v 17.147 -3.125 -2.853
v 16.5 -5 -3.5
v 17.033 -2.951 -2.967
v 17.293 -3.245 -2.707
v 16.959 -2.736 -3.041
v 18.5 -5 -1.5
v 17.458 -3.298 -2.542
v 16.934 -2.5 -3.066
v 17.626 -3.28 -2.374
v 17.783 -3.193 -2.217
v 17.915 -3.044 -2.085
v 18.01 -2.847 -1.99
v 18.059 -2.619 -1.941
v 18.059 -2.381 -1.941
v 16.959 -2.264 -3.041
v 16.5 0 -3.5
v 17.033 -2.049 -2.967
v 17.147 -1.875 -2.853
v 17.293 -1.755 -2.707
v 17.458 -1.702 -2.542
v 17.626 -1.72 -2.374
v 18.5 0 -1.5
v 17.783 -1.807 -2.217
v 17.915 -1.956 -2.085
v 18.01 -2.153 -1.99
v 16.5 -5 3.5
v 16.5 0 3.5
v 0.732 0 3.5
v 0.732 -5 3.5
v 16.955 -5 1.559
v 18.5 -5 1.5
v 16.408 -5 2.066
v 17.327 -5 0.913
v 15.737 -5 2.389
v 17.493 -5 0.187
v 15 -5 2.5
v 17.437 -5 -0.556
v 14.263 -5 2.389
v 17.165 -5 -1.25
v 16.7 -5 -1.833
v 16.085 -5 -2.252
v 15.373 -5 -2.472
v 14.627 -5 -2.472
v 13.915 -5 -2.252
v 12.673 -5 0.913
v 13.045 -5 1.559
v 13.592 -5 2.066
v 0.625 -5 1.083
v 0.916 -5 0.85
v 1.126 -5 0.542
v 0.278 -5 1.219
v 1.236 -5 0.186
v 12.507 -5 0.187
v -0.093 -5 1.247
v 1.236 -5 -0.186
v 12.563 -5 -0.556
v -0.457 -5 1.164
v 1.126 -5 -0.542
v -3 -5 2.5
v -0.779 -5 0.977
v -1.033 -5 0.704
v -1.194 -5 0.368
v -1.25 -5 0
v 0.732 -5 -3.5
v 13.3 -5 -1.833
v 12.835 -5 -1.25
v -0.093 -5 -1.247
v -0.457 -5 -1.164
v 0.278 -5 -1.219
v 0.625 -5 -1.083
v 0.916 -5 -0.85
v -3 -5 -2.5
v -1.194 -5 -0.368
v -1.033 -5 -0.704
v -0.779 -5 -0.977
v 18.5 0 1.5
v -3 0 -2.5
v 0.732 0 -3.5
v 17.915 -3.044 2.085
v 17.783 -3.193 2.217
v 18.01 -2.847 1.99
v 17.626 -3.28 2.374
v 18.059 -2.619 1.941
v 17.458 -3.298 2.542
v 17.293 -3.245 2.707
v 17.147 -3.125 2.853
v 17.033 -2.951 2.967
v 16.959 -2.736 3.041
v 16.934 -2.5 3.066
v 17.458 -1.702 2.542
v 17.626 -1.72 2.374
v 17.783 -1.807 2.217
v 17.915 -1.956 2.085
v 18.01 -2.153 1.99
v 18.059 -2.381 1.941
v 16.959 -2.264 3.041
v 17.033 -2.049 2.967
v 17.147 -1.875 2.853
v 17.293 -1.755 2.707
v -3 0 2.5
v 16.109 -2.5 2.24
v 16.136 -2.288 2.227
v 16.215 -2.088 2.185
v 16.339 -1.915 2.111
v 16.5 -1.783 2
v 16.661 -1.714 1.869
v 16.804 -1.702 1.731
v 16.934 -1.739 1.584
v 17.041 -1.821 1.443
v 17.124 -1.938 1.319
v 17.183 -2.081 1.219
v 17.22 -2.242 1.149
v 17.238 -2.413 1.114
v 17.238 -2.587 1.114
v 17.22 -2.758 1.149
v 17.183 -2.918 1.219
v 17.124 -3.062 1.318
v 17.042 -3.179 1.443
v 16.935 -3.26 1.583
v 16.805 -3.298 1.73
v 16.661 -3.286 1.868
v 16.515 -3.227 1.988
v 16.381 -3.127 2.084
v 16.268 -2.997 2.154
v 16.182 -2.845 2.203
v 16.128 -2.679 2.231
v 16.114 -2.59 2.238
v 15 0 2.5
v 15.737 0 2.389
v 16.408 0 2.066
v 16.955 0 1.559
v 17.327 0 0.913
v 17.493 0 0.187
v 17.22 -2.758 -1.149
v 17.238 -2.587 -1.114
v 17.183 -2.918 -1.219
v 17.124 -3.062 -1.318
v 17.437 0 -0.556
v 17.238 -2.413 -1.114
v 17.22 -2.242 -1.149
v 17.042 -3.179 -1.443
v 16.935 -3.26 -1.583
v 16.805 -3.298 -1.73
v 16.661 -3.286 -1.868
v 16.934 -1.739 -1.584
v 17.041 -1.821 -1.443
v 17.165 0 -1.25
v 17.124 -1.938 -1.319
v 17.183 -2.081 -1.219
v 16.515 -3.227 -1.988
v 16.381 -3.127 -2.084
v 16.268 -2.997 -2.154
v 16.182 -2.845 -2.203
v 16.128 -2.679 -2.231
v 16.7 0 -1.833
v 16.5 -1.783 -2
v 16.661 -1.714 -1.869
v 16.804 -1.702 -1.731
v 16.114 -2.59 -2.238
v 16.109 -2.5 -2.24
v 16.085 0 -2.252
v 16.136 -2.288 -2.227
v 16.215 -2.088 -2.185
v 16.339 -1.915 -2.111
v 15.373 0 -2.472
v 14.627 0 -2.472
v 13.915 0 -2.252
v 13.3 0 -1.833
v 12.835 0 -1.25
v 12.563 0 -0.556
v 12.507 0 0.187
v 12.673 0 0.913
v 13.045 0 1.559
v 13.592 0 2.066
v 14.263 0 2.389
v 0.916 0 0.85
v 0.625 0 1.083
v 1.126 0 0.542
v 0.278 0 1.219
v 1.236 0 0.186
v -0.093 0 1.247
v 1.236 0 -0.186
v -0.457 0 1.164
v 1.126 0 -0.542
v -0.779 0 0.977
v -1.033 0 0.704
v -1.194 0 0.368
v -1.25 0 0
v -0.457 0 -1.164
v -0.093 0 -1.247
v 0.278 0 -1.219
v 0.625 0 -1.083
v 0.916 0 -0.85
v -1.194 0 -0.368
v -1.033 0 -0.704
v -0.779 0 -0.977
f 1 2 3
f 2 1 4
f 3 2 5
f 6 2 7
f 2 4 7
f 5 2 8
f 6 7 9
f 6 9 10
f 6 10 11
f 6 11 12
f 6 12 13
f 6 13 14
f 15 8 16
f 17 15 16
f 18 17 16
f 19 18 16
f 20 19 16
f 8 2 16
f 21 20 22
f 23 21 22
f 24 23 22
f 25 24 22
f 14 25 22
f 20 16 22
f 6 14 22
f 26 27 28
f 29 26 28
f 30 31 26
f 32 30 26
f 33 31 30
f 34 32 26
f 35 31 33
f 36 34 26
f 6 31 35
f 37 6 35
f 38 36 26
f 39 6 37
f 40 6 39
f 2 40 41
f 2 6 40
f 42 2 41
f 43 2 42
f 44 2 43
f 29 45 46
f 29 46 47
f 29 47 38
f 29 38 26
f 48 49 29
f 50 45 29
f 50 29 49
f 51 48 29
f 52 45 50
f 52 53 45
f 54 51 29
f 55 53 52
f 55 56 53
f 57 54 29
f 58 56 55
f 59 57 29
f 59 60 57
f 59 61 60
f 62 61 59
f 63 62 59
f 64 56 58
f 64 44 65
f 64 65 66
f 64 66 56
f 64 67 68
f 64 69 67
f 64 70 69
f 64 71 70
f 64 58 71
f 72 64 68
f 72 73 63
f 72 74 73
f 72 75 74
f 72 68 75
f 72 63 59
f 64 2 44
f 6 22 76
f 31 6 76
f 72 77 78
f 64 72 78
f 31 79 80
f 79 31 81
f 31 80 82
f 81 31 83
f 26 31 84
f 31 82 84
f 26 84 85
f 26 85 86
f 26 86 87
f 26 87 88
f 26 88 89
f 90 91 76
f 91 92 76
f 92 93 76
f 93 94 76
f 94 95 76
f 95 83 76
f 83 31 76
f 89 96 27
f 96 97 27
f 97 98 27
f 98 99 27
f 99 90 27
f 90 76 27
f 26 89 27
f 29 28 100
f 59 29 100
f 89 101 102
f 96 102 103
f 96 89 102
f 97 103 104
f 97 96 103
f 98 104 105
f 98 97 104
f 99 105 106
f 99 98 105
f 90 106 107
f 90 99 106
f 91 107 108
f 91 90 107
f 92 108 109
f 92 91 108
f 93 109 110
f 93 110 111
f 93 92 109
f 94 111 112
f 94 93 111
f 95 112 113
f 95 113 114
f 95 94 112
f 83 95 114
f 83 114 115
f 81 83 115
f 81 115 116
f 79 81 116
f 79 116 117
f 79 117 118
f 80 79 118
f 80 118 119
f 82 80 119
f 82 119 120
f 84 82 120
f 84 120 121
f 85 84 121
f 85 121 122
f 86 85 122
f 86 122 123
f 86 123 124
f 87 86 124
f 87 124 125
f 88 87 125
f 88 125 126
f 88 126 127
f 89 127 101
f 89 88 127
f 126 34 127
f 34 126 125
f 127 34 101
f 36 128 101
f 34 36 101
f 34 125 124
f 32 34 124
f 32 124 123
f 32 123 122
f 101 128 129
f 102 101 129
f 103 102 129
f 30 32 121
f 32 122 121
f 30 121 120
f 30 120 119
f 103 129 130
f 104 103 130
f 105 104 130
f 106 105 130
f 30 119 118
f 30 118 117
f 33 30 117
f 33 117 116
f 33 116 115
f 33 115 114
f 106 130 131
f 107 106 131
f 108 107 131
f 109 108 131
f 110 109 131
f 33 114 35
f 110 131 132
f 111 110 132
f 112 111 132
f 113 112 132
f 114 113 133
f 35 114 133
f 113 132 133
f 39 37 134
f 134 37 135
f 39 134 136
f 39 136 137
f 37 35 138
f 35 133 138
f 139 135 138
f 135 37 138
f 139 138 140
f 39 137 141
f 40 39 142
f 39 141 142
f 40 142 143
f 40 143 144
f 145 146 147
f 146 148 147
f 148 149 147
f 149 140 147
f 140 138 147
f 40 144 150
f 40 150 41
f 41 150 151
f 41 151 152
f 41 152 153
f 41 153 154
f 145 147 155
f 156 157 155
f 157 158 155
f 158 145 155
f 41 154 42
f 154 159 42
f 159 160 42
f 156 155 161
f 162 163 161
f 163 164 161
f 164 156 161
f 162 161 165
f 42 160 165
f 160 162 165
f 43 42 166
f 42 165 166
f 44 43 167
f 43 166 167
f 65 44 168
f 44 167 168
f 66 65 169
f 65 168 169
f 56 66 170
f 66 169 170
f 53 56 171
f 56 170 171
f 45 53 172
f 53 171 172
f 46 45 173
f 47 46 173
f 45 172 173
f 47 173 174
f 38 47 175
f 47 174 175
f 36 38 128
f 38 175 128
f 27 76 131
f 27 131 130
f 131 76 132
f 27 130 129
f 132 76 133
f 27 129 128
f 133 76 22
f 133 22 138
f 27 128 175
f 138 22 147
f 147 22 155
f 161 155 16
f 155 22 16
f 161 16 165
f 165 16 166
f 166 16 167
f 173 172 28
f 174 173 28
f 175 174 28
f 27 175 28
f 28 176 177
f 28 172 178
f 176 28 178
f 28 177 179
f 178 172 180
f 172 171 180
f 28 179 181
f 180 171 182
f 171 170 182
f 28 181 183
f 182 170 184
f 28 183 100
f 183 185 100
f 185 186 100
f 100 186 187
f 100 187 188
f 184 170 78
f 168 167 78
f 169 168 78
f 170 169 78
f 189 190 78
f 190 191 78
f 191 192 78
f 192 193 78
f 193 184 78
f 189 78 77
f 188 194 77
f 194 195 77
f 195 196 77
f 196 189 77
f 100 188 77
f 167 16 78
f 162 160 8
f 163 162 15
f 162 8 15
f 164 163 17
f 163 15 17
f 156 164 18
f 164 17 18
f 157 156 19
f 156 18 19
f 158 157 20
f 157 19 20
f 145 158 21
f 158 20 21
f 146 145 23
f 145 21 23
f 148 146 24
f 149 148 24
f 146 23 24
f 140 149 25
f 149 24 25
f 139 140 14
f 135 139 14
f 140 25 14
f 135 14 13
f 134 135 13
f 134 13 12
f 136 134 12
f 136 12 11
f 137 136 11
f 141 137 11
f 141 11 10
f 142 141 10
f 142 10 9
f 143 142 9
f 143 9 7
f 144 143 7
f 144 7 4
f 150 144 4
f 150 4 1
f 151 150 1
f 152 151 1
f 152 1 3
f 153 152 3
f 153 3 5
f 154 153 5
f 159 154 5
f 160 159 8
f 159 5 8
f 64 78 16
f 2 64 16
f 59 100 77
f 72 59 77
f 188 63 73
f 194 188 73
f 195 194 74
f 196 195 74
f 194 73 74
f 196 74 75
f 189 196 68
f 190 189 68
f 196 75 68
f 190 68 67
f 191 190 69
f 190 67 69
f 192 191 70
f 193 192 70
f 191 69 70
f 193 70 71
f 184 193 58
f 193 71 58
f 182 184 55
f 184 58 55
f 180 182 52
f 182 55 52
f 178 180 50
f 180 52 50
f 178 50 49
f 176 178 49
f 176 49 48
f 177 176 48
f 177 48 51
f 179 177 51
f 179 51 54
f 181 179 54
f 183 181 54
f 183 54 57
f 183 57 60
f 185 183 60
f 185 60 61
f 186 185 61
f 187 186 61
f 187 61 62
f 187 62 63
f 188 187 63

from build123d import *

# Parameters (mm, degrees)
BLOCK_R                = 2.5
BOSS_EXTRUDE1_DEPTH    = 5
M3_TAPPED_HOLE1_D      = 2.5
M2_TAPPED_HOLE1_REACH  = 21.397
M2_TAPPED_HOLE1_BORE_R = 0.8


with BuildPart() as part:
    # block → Boss-Extrude1 (new body)
    with BuildSketch(Plane(origin=(0, 0, 0), x_dir=(1, 0, 0), z_dir=(0, 1, 0))):
        Polygon((0.732050808, 3.5), (16.5, 3.5), (18.5, 1.5), (18.5, -1.5), (16.5, -3.5), (0.732050808, -3.5), (-3, -2.5), (-3, 2.5), align=None)
        with Locations(Location((15, 0, 0), (0, 0, 270))):
            Circle(BLOCK_R, mode=Mode.SUBTRACT)
    extrude(amount=-BOSS_EXTRUDE1_DEPTH)

    # M3 Tapped Hole1 (through all)
    with Locations(Plane(origin=(0, 0, 0), x_dir=(1, 0, 0), z_dir=(0, 1, 0))):
        with Locations((0, 0)):
            Hole(M3_TAPPED_HOLE1_D / 2)

    # M2 Tapped Hole1 bore → M2 Tapped Hole1 (cut, up to next)
    with BuildSketch(Plane(origin=(10, 0, -10), x_dir=(-0.7071067811865465, 0, -0.7071067811865486), z_dir=(0.7071067811865486, 0, -0.7071067811865465)), mode=Mode.PRIVATE) as m2_tapped_hole1_sk1:
        with Locations((-10.606601718, -2.5)):
            Circle(M2_TAPPED_HOLE1_BORE_R)
    m2_tapped_hole1_tool1 = extrude(m2_tapped_hole1_sk1.sketch, amount=-M2_TAPPED_HOLE1_REACH, mode=Mode.PRIVATE) & part.part
    m2_tapped_hole1 = m2_tapped_hole1_tool1.solids().sort_by_distance((17.5, -2.5, -2.5))[0]
    add(m2_tapped_hole1, mode=Mode.SUBTRACT)

    # Mirror1: M2 Tapped Hole1 across plane
    add(m2_tapped_hole1.mirror(Plane.XY), mode=Mode.SUBTRACT)


solid = part.part
